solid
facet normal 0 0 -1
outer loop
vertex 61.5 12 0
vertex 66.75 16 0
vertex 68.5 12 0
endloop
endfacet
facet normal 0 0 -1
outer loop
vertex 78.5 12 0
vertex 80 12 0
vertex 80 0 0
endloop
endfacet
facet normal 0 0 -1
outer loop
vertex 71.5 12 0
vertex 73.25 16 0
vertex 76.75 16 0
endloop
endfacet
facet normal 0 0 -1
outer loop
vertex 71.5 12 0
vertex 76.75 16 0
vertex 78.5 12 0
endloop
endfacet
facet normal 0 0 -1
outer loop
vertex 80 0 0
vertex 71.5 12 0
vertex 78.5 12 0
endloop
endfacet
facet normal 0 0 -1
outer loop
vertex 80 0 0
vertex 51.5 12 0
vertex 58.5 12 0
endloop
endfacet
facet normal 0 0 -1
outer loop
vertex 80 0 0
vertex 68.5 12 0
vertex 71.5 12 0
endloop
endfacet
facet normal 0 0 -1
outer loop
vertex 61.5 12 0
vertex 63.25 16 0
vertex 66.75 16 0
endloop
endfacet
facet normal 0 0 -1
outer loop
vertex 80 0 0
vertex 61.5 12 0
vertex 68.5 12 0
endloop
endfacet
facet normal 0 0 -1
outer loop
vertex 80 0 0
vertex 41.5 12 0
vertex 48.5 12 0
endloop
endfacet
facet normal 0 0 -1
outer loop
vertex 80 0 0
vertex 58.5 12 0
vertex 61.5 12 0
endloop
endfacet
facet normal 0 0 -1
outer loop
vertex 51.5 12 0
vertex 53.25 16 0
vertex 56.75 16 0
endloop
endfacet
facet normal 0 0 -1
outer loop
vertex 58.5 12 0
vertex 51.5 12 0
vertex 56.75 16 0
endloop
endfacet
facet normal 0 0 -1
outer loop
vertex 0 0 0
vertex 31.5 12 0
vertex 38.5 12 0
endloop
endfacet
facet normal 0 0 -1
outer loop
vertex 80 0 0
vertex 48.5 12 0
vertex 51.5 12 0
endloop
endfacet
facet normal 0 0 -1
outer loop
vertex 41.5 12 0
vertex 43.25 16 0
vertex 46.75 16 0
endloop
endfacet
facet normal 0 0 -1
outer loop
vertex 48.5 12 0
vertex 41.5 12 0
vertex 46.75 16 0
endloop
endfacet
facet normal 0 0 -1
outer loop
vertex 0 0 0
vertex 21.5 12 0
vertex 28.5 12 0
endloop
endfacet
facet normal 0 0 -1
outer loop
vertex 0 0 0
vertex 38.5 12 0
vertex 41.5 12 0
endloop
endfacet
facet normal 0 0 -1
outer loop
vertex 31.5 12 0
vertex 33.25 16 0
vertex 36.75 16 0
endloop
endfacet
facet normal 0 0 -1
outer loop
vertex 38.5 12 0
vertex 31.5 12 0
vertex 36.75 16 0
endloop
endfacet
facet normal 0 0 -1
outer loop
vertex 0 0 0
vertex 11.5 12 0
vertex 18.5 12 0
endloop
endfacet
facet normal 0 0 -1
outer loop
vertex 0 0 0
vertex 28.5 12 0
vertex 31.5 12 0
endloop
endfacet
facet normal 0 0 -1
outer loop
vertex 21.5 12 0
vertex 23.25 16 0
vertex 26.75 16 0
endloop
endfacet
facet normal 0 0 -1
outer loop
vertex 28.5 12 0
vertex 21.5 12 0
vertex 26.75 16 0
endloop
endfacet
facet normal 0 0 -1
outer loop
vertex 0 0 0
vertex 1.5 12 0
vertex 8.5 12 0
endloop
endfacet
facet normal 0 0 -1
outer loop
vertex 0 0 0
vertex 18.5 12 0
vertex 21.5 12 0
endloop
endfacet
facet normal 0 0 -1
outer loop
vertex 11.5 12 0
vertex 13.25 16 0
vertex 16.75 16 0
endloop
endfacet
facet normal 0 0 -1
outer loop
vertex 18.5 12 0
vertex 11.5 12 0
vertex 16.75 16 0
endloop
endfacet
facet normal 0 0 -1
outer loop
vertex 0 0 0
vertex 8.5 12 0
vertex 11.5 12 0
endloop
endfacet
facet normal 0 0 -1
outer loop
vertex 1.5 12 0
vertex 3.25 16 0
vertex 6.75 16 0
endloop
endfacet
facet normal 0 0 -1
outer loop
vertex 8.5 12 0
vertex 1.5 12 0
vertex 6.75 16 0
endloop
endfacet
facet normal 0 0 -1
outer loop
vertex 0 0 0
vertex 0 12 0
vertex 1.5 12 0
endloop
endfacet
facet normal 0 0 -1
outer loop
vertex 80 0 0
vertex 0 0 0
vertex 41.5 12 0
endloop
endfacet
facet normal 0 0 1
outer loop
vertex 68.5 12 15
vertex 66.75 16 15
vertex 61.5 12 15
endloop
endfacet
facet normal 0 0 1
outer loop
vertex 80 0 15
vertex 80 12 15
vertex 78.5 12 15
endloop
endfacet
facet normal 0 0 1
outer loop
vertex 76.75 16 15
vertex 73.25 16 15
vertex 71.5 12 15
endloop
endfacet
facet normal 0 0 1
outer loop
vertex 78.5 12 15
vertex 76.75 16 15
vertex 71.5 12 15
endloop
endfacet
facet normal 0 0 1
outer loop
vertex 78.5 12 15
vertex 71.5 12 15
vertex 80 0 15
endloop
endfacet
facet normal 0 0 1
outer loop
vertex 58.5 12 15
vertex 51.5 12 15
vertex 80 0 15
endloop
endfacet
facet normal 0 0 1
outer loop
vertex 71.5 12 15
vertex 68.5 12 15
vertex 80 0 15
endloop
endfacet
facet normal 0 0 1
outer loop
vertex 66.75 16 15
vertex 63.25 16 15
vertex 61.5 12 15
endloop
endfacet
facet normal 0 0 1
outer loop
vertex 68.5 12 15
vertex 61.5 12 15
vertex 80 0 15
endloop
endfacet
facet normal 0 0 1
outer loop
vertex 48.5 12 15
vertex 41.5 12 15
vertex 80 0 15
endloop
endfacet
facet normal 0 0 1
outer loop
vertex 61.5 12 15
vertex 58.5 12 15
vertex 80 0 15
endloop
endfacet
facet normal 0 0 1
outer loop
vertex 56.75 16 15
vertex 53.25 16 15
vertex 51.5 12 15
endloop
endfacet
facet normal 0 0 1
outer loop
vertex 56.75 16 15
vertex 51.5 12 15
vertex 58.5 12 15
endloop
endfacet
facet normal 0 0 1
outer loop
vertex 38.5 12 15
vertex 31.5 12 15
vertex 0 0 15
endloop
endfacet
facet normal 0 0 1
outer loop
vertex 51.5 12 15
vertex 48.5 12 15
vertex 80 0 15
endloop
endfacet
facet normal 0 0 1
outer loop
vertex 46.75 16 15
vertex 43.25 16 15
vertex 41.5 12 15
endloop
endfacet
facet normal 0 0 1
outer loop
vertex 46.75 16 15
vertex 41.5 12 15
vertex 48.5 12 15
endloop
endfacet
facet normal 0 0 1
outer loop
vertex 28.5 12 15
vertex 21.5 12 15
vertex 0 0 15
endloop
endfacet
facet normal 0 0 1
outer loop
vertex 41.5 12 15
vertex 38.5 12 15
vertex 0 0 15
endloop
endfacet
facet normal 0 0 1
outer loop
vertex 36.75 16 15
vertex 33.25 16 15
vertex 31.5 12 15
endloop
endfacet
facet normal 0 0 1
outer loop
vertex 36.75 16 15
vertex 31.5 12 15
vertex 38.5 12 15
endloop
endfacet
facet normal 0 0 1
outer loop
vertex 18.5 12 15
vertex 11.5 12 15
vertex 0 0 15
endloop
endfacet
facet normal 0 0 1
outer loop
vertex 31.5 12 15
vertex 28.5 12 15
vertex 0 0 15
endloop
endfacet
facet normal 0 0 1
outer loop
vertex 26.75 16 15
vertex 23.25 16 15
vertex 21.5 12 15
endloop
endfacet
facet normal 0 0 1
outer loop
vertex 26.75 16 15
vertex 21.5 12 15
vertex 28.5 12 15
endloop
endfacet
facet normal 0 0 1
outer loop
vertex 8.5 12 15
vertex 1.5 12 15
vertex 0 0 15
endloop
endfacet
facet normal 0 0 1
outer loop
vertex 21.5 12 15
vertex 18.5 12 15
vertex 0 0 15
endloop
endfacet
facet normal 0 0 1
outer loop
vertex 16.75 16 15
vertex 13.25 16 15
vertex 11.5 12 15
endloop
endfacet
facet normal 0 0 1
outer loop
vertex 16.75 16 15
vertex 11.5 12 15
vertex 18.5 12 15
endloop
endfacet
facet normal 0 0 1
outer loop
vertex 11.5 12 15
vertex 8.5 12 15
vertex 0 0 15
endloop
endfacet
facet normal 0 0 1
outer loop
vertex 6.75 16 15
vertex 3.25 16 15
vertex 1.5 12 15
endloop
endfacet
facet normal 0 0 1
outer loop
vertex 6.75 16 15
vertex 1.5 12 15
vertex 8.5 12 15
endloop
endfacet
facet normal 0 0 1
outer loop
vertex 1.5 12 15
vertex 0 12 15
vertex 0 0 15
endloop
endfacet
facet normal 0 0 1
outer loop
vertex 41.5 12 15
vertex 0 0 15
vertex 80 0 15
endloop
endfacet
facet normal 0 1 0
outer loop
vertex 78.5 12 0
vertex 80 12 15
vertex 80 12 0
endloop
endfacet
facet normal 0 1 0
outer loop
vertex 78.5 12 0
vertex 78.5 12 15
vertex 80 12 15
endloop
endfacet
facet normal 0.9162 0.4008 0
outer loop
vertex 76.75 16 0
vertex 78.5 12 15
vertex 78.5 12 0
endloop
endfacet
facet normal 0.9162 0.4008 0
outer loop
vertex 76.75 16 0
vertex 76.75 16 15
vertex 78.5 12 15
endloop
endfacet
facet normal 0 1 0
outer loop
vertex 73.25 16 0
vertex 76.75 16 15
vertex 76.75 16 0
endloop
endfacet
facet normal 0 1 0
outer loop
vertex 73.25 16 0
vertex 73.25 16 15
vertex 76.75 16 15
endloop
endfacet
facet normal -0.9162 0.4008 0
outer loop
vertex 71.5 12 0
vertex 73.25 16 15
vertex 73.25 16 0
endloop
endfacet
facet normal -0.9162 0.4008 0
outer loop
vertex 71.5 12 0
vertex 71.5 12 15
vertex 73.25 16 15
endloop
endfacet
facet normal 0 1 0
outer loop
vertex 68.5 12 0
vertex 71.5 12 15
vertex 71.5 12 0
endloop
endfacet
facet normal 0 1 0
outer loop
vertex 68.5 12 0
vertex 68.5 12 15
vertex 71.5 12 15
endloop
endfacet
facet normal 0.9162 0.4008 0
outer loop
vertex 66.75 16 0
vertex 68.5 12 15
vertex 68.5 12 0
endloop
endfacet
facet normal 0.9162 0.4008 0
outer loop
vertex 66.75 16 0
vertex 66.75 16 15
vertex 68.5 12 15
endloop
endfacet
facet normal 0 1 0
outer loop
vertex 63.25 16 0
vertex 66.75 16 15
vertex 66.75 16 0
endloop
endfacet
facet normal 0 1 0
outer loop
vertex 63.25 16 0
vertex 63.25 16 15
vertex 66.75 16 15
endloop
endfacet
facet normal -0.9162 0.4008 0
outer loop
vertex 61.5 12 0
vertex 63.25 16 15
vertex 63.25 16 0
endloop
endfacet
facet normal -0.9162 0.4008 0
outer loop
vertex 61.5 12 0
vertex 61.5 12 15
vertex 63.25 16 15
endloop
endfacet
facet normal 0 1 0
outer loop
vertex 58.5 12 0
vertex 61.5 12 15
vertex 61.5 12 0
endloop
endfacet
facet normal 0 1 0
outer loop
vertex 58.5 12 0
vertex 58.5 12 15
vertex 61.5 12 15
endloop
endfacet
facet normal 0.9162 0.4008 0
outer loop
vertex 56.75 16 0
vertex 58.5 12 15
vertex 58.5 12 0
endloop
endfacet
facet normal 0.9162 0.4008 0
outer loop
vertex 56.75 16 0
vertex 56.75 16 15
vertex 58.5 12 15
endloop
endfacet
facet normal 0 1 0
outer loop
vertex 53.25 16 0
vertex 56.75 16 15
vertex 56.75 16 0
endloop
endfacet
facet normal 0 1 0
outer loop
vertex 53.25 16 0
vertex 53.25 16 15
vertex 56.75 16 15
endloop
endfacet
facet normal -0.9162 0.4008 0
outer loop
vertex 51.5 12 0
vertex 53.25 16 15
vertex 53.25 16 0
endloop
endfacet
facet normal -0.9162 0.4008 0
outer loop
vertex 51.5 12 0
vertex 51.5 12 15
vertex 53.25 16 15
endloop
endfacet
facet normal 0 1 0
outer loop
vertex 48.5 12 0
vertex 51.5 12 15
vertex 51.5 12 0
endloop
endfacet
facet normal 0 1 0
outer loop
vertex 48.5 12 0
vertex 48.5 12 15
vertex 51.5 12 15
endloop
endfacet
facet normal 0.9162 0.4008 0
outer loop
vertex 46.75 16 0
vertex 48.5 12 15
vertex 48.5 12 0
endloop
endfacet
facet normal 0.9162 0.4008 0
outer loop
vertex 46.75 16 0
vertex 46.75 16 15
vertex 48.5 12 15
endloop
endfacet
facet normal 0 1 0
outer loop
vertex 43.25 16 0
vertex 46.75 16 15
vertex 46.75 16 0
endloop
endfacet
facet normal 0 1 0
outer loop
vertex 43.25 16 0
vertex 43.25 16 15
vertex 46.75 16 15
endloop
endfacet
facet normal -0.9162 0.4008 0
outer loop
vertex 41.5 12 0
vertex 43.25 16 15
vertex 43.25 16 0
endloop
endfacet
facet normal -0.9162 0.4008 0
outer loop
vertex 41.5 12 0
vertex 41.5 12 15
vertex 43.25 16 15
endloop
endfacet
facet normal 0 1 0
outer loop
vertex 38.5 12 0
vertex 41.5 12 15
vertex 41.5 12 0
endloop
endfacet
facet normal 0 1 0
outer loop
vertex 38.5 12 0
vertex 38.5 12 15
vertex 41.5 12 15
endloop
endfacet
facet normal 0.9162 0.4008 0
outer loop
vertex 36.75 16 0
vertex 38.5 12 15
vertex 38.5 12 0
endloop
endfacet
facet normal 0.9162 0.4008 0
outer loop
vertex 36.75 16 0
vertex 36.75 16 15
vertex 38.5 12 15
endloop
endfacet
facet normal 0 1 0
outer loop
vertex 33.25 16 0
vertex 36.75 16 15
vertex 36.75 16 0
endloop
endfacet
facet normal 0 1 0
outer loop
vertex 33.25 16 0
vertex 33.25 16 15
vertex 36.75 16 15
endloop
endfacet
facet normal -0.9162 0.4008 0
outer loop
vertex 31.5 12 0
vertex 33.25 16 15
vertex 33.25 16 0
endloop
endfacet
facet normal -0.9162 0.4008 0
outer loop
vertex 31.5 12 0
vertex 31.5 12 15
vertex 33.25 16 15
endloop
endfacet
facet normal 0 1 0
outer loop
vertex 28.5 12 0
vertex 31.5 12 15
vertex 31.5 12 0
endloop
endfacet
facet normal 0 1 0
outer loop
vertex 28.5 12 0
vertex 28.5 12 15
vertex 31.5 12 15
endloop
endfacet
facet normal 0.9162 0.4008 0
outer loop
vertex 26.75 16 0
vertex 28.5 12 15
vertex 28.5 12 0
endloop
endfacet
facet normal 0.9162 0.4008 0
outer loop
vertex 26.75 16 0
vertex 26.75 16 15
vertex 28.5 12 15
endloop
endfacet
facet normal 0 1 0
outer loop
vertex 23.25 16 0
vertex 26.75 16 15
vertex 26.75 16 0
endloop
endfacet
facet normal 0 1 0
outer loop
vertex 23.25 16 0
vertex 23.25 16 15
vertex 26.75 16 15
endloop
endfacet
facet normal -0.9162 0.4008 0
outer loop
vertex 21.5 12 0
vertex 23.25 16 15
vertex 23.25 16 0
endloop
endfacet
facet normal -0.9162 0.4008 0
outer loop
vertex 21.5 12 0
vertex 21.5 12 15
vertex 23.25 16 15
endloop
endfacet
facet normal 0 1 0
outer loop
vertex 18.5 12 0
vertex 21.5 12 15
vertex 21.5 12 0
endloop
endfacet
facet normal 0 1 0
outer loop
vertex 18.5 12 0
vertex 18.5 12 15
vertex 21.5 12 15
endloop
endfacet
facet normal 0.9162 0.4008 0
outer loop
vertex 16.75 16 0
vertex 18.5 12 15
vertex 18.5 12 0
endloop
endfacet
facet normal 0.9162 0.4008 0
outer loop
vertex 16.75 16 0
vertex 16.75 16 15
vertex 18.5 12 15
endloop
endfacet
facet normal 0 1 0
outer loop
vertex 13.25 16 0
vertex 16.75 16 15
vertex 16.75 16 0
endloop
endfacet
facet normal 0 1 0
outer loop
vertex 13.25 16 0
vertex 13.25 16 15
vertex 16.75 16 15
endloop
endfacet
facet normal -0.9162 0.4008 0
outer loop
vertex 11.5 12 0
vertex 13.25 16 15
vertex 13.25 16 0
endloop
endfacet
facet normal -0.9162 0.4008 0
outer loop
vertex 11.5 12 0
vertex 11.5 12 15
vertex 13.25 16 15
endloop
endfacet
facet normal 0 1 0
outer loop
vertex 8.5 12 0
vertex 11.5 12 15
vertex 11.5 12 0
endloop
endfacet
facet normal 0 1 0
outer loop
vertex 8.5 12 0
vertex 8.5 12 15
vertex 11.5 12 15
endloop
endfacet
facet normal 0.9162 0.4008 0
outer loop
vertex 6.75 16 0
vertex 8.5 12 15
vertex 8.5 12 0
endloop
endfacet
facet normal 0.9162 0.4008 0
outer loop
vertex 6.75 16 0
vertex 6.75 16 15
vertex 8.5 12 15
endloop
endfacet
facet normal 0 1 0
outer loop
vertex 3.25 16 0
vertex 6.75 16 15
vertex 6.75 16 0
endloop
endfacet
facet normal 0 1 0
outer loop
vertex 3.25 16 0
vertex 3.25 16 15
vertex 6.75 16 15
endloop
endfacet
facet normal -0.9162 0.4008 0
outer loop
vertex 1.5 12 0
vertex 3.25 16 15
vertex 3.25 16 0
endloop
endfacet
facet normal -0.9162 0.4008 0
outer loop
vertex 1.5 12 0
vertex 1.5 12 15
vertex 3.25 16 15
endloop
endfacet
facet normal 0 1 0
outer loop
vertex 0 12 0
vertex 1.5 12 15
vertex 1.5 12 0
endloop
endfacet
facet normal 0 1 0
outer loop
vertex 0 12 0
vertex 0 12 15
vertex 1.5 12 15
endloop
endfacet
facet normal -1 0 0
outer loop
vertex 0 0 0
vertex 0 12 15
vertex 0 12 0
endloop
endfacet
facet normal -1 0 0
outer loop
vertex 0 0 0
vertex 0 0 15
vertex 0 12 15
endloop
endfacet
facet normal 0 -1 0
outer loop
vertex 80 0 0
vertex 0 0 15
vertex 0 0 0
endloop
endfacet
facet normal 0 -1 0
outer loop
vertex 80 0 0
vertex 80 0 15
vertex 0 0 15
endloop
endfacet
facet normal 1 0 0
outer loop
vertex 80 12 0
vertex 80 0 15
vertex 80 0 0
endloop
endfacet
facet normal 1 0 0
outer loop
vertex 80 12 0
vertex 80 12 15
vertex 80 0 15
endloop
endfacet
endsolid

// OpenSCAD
$fn = 32;

// ----------------------------------------------------------------------
// Gear rack: 8 teeth, pitch 10 mm
// ----------------------------------------------------------------------

// --- parameters (mm) ---
teeth = 8;                // number of teeth
pitch = 10;               // tooth pitch, X
root_w = 7;               // tooth width at the root
tip_w = 3.5;              // tooth width at the tip
base_h = 12;              // rack body height, Y
tooth_h = 4;              // tooth height above the body
plate_t = 15;             // rack width, Z (extrusion height)
fit_tol = 0.1;            // declared fit tolerance (prompt contract)
free_tol = 0.3;           // declared free tolerance (prompt contract)

rack_l = teeth * pitch;  // overall length
total_h = base_h + tooth_h;  // overall height

profile = [[0, 0], [80, 0], [80, 12], [78.5, 12], [76.75, 16], [73.25, 16], [71.5, 12], [68.5, 12], [66.75, 16], [63.25, 16], [61.5, 12], [58.5, 12], [56.75, 16], [53.25, 16], [51.5, 12], [48.5, 12], [46.75, 16], [43.25, 16], [41.5, 12], [38.5, 12], [36.75, 16], [33.25, 16], [31.5, 12], [28.5, 12], [26.75, 16], [23.25, 16], [21.5, 12], [18.5, 12], [16.75, 16], [13.25, 16], [11.5, 12], [8.5, 12], [6.75, 16], [3.25, 16], [1.5, 12], [0, 12]];  // primary outline, 36 points, counter clockwise

// --- the one profile operation ---
linear_extrude(height = plate_t) polygon(points = profile);
